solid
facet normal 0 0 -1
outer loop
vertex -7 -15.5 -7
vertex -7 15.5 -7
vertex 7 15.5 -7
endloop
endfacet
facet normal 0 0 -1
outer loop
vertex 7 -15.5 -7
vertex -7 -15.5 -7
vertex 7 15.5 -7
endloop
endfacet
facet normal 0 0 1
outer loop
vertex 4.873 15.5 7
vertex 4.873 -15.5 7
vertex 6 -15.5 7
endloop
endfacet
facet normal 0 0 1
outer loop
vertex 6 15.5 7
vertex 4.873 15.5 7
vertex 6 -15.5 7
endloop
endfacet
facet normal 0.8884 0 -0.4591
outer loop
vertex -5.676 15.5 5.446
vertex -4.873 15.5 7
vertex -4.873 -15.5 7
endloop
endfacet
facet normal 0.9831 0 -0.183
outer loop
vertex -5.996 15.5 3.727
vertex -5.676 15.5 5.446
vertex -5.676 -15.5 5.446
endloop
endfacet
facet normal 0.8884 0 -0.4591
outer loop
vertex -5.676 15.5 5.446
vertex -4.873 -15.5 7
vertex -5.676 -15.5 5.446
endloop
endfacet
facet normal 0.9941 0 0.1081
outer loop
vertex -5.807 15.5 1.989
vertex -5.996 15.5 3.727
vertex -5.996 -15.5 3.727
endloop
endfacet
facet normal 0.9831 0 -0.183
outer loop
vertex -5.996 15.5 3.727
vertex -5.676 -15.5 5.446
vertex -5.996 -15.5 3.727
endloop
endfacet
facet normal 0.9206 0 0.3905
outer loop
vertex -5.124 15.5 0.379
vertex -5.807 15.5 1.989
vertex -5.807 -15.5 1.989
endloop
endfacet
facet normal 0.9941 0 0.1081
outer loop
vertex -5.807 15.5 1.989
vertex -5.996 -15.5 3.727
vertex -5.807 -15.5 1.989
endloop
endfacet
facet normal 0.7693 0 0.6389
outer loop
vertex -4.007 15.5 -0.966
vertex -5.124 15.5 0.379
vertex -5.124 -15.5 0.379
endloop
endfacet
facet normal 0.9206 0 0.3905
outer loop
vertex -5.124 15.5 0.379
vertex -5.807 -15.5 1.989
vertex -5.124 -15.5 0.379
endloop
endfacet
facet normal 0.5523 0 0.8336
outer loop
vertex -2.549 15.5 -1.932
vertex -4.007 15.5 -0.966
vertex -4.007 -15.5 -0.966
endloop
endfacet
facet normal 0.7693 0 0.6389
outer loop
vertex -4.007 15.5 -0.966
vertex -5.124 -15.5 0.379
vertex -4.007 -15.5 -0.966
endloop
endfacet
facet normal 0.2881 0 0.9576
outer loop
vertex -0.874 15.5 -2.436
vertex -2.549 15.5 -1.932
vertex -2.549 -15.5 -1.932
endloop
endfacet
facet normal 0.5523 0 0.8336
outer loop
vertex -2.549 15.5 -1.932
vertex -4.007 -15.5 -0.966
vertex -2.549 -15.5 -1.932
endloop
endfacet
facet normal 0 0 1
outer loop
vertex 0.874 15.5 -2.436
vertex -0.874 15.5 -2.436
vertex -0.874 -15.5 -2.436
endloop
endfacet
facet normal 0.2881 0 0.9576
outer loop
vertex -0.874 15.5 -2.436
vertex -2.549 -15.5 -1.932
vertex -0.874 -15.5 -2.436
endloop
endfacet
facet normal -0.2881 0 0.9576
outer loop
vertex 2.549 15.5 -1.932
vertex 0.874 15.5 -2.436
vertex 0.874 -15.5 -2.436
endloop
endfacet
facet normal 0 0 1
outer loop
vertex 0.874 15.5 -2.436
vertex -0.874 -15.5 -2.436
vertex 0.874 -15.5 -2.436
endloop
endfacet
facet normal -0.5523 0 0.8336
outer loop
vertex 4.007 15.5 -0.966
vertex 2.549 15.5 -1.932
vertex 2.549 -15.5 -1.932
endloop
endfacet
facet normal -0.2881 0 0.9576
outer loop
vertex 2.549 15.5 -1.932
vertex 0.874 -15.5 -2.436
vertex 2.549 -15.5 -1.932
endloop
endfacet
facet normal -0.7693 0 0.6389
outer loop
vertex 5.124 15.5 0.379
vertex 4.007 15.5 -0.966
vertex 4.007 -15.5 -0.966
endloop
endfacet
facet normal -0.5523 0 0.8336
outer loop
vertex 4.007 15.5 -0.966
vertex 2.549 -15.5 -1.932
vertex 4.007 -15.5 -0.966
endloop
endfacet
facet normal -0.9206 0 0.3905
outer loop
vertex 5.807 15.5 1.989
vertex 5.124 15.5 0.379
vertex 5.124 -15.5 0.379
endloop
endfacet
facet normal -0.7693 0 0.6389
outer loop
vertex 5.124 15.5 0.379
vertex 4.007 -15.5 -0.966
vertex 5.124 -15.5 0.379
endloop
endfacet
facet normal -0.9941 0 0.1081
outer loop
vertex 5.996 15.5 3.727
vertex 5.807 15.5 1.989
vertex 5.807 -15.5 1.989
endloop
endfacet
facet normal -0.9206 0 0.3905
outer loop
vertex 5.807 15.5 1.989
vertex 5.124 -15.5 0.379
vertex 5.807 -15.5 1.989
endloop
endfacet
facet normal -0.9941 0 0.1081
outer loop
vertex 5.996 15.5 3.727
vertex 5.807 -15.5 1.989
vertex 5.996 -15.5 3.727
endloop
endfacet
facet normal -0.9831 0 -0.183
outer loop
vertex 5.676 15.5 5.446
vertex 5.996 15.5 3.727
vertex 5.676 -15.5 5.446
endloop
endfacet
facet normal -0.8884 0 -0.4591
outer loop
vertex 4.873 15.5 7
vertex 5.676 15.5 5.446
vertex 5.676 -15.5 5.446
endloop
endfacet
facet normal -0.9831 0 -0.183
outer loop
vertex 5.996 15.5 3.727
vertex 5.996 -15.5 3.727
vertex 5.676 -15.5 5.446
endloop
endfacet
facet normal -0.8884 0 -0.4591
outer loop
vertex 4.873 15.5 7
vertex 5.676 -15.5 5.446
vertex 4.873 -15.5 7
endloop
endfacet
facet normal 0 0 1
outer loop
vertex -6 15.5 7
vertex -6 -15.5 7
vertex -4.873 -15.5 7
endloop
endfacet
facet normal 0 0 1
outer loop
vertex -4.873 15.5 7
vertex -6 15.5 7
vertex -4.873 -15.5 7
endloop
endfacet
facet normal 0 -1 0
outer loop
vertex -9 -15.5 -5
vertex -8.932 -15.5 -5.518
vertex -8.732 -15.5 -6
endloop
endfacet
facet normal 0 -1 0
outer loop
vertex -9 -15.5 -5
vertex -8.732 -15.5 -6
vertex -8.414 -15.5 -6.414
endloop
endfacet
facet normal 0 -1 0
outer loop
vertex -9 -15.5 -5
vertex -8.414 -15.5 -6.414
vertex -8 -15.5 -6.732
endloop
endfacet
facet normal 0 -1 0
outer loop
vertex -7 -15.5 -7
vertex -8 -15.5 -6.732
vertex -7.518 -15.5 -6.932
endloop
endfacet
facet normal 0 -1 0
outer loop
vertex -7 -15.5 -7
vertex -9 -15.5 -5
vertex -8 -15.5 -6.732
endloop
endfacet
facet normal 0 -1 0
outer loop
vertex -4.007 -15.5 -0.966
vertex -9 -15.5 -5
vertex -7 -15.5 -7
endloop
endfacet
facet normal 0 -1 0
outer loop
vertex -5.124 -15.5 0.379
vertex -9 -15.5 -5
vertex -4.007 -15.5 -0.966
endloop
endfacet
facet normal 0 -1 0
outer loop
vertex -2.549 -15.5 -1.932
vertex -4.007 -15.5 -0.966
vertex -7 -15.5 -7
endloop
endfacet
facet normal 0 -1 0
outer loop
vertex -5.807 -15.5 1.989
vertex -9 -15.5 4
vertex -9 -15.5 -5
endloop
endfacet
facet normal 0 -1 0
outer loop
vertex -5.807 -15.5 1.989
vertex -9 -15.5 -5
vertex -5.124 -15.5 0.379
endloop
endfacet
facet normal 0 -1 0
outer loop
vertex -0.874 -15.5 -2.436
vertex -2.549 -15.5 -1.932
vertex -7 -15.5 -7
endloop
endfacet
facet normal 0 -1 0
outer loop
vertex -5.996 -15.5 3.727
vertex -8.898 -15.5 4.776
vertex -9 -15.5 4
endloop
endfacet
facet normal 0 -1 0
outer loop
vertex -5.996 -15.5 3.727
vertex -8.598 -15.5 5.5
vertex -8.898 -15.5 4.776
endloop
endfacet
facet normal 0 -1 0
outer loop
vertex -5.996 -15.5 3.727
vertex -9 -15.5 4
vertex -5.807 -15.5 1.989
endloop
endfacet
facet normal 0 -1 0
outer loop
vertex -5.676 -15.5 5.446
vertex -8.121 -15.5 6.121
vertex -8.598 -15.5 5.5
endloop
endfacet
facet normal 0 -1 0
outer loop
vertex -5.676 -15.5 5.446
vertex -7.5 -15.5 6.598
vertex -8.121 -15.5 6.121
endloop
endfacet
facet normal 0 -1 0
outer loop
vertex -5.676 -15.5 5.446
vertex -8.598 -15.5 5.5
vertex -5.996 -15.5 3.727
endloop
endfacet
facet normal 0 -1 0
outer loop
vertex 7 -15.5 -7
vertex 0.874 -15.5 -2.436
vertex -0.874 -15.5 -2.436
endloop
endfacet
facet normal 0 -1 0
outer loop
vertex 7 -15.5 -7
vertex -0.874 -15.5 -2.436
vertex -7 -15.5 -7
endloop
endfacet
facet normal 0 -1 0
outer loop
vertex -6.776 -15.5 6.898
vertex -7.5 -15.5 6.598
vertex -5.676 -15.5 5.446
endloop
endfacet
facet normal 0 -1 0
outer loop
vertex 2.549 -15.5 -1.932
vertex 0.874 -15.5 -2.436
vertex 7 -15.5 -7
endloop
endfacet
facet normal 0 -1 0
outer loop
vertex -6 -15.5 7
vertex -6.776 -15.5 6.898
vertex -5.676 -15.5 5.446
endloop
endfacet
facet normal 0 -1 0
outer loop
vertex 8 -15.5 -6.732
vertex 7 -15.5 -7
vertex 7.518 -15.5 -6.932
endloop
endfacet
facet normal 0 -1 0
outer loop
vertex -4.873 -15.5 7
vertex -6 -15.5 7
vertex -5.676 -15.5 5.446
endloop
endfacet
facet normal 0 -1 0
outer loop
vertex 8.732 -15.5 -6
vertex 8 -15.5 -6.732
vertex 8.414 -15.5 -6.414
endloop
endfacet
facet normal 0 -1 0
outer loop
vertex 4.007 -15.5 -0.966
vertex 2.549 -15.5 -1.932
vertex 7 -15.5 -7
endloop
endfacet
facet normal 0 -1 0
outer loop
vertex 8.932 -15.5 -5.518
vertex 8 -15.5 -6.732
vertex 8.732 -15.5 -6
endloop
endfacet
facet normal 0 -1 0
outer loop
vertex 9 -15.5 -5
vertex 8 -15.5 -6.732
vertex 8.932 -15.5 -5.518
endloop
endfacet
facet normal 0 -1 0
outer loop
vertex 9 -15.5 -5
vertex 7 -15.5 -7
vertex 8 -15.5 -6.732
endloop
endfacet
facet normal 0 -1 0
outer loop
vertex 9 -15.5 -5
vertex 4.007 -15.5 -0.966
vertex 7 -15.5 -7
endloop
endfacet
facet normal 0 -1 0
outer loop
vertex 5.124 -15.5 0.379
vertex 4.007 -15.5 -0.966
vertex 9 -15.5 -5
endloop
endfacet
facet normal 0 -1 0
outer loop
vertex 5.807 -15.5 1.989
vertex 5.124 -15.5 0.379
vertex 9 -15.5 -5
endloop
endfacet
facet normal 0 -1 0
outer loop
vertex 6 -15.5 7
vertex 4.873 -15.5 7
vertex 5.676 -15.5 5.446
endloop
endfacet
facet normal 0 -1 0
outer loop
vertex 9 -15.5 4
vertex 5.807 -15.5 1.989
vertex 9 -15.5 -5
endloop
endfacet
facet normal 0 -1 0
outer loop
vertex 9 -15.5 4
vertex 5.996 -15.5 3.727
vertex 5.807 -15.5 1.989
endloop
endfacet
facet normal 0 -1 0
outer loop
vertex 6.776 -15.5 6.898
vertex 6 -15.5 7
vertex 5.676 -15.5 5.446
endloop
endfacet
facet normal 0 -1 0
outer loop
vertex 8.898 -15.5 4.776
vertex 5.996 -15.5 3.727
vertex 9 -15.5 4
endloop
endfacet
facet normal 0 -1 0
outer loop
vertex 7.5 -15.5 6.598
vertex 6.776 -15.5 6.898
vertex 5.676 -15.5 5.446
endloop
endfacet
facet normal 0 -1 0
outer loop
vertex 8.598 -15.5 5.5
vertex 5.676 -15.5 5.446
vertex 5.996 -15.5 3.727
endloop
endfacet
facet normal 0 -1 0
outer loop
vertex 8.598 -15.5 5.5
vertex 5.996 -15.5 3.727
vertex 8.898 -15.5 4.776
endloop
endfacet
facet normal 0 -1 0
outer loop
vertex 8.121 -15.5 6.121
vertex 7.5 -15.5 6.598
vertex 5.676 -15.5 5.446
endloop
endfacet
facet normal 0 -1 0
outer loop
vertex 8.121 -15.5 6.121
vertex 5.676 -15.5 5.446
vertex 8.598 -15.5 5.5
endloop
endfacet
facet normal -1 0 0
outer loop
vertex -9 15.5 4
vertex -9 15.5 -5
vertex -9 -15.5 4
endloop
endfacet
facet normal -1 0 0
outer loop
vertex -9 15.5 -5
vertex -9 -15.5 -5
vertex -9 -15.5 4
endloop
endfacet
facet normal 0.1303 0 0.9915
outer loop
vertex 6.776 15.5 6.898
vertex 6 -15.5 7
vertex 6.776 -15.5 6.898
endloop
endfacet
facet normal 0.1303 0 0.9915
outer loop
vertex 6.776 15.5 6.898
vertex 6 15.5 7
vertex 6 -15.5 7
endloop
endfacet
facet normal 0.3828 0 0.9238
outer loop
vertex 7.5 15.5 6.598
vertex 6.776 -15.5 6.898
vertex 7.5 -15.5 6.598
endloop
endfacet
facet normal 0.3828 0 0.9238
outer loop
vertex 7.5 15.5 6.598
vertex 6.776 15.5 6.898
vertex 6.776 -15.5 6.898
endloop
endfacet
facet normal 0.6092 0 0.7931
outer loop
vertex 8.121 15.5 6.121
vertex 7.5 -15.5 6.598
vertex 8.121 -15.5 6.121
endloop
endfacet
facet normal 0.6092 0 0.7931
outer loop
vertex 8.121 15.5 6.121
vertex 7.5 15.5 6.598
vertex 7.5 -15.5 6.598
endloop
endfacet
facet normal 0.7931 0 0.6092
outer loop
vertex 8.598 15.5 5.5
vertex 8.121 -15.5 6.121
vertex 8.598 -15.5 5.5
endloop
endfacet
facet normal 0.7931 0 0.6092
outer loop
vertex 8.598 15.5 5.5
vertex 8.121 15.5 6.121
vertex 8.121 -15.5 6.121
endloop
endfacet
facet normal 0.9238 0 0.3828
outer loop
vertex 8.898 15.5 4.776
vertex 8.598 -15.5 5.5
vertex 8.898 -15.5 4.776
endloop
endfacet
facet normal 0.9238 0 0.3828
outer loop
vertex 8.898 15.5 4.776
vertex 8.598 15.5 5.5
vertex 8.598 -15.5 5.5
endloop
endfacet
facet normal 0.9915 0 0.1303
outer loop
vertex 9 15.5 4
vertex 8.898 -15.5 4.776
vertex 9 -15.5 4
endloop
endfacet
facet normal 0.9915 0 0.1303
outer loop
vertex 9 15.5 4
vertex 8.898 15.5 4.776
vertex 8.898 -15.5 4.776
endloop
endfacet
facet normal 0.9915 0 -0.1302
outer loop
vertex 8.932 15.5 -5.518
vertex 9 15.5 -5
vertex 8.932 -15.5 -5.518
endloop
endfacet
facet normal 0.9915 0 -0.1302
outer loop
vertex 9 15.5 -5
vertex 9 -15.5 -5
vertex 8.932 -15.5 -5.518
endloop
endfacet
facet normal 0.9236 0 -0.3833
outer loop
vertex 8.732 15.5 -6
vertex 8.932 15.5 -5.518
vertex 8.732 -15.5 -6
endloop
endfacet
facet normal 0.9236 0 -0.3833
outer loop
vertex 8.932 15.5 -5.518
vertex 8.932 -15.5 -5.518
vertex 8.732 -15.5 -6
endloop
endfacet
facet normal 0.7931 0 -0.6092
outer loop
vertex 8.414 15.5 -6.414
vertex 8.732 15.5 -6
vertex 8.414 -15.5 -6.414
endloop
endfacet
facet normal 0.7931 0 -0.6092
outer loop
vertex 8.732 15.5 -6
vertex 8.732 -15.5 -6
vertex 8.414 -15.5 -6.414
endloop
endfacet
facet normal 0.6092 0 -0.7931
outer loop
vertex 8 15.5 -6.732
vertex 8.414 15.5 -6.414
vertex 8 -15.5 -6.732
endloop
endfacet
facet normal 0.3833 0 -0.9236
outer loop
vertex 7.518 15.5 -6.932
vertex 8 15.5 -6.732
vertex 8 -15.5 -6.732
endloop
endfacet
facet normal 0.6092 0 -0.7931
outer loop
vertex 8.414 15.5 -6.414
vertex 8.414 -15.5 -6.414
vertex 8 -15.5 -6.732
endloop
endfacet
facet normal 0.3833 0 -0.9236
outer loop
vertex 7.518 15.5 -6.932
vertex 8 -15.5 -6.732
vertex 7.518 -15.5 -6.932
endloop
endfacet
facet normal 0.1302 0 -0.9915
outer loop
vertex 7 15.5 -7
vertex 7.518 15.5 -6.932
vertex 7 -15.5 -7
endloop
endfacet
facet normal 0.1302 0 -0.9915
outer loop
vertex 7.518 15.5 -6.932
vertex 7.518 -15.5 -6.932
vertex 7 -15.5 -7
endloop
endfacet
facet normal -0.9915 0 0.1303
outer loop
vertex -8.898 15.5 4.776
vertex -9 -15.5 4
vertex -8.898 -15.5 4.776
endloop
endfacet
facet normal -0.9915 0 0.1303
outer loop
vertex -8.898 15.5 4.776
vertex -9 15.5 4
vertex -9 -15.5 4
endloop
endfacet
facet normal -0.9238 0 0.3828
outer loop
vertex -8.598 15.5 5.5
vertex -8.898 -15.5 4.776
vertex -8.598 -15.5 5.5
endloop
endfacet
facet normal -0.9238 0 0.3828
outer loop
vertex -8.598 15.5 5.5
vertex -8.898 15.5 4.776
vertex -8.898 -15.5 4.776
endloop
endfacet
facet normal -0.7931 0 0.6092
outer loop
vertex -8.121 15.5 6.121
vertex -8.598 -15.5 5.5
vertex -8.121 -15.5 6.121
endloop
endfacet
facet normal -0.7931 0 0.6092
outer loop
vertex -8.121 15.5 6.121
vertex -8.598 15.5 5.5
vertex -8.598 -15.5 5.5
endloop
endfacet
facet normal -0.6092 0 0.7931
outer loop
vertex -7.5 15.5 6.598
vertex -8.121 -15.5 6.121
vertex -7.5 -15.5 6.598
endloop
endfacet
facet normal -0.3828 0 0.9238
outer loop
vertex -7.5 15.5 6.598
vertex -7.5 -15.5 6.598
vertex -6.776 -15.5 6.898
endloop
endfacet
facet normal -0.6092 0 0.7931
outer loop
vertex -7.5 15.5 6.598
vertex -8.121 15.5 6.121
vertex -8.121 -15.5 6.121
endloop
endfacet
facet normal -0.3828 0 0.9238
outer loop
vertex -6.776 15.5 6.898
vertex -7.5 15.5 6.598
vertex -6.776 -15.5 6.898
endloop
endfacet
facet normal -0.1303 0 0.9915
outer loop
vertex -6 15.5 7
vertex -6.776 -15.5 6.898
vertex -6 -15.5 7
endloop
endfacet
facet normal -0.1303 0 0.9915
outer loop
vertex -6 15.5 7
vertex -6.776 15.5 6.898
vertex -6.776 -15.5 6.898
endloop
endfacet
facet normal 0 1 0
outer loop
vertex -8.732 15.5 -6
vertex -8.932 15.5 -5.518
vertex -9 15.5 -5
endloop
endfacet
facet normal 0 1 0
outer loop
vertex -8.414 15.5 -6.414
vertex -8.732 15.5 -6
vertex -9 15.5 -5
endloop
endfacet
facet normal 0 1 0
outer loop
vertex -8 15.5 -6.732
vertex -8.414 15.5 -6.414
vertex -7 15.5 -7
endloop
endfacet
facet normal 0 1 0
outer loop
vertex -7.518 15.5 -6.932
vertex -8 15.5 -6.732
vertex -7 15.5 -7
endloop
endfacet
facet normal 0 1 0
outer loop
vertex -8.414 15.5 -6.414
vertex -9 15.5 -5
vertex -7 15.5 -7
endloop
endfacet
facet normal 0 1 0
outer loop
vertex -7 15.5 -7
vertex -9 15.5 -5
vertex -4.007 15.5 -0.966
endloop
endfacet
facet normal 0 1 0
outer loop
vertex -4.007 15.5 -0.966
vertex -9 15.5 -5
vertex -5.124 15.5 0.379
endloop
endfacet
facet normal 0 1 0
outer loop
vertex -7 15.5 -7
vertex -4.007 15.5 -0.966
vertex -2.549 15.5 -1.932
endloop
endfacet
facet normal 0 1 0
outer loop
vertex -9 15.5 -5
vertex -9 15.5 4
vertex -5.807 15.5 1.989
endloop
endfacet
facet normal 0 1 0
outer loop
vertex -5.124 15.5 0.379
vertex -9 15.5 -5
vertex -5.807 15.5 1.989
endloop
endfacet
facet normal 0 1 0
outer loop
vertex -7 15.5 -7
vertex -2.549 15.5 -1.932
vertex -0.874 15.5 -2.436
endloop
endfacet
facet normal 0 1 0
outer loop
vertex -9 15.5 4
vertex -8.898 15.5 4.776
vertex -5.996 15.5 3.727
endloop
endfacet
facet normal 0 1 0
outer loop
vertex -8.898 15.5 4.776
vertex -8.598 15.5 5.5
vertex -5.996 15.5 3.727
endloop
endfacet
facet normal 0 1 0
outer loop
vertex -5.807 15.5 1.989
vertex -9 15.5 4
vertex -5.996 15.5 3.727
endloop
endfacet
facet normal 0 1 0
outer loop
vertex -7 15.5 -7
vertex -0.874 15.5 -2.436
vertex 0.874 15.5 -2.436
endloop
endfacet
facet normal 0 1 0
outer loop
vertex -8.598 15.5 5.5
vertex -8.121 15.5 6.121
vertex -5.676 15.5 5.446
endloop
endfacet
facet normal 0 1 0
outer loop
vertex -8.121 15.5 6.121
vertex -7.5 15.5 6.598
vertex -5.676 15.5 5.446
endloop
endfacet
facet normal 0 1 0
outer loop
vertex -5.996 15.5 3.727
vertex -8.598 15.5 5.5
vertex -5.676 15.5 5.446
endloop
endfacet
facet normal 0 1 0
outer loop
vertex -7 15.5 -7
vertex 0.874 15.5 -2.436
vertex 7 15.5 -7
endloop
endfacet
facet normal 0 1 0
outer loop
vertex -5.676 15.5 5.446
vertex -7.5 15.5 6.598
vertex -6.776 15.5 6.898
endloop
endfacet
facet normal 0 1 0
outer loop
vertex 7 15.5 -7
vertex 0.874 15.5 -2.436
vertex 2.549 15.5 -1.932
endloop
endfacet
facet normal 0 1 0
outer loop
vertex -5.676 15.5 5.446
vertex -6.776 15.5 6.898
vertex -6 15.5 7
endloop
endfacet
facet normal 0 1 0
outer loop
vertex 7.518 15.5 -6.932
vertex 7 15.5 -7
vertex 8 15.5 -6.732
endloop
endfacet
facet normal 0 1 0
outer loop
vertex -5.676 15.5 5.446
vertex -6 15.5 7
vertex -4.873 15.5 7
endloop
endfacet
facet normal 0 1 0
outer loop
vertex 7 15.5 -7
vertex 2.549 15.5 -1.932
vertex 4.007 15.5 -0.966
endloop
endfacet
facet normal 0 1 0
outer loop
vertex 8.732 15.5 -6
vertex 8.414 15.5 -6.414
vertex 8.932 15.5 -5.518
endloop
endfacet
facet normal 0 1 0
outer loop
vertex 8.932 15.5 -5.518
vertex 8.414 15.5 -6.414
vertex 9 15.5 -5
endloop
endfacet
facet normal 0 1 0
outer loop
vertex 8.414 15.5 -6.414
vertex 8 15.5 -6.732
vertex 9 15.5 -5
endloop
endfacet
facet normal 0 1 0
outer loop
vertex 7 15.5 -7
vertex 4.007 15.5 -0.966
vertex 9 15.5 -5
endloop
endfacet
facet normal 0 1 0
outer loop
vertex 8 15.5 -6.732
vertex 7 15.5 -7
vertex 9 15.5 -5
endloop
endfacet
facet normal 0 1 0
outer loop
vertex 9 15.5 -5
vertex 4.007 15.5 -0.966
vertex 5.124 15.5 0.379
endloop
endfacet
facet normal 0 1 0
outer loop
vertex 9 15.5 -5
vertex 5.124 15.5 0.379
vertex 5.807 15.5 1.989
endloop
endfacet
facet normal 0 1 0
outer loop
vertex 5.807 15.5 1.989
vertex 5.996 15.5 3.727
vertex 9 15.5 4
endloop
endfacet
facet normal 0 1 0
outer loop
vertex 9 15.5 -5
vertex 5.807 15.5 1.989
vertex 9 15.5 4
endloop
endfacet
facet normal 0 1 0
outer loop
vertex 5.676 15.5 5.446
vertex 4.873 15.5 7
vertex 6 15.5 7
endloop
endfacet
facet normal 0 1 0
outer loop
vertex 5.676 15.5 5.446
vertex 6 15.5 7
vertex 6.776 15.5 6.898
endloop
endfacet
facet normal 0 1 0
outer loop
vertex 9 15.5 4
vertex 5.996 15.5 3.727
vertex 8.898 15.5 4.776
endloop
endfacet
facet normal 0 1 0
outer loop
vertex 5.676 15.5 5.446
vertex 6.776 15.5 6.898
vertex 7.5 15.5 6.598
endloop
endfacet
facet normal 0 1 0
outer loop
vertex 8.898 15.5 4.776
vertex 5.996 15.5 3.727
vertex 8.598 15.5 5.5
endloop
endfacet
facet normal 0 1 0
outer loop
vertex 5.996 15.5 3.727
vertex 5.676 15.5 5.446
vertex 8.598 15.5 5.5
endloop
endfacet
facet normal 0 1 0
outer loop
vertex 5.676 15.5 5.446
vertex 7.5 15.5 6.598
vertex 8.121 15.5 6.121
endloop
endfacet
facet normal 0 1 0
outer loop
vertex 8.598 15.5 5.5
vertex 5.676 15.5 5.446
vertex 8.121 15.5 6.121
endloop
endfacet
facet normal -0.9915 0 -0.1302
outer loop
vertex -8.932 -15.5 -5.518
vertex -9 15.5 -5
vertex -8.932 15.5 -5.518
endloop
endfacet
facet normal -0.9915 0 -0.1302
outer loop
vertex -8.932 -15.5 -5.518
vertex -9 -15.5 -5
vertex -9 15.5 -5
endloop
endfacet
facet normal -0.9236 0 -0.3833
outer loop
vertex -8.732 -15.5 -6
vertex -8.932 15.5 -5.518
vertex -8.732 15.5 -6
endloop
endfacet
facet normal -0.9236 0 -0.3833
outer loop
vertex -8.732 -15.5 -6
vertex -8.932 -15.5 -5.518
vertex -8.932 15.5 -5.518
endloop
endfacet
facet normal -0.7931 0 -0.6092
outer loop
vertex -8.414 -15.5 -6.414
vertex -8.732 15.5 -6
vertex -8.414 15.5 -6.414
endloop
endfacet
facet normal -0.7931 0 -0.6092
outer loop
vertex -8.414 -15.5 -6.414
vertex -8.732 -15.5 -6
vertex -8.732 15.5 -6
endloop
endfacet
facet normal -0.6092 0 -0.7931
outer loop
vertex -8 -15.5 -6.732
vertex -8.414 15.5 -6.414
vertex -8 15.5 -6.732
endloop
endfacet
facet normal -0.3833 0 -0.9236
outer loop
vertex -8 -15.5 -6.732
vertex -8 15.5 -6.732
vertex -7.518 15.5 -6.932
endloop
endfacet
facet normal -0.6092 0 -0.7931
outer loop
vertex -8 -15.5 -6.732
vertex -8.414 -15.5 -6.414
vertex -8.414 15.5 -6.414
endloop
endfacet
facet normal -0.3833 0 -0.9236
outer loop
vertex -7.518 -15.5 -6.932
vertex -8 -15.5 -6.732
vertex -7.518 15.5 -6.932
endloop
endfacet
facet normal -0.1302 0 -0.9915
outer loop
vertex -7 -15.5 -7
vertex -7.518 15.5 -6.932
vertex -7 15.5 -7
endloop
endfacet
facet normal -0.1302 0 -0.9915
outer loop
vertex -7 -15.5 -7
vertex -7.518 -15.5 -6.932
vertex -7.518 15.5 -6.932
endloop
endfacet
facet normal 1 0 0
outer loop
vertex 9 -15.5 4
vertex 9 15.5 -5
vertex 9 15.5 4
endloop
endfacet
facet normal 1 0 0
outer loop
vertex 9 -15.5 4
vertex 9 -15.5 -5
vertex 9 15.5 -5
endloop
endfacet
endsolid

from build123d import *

# Parameters (mm, degrees)
SKETCH_W     = 18
SKETCH_H     = 14
PAD_DEPTH    = 15.5
FILLET_R     = 2
SKETCH001_R  = 6
POCKET_DEPTH = 31.001
FILLET001_R  = 3


with BuildPart() as part:
    # Sketch → Pad (new body, symmetric)
    with BuildSketch(Plane.XZ):
        Rectangle(SKETCH_W, SKETCH_H)
    extrude(amount=PAD_DEPTH, both=True)

    # Fillet
    fillet_edges = [part.edges().sort_by_distance(p)[0] for p in [
        (-9, 0, -7),
        (9, 0, -7),
    ]]
    fillet(fillet_edges, radius=FILLET_R)

    # Sketch001 → Pocket (cut, through all)
    with BuildSketch(Plane.XZ.offset(15.5)):
        with Locations((0, 3.5)):
            Circle(SKETCH001_R)
    extrude(amount=-POCKET_DEPTH, mode=Mode.SUBTRACT)

    # Fillet001
    fillet001_edges = [part.edges().sort_by_distance(p)[0] for p in [
        (9, 0, 7),
        (-9, 0, 7),
    ]]
    fillet(fillet001_edges, radius=FILLET001_R)


solid = part.part
